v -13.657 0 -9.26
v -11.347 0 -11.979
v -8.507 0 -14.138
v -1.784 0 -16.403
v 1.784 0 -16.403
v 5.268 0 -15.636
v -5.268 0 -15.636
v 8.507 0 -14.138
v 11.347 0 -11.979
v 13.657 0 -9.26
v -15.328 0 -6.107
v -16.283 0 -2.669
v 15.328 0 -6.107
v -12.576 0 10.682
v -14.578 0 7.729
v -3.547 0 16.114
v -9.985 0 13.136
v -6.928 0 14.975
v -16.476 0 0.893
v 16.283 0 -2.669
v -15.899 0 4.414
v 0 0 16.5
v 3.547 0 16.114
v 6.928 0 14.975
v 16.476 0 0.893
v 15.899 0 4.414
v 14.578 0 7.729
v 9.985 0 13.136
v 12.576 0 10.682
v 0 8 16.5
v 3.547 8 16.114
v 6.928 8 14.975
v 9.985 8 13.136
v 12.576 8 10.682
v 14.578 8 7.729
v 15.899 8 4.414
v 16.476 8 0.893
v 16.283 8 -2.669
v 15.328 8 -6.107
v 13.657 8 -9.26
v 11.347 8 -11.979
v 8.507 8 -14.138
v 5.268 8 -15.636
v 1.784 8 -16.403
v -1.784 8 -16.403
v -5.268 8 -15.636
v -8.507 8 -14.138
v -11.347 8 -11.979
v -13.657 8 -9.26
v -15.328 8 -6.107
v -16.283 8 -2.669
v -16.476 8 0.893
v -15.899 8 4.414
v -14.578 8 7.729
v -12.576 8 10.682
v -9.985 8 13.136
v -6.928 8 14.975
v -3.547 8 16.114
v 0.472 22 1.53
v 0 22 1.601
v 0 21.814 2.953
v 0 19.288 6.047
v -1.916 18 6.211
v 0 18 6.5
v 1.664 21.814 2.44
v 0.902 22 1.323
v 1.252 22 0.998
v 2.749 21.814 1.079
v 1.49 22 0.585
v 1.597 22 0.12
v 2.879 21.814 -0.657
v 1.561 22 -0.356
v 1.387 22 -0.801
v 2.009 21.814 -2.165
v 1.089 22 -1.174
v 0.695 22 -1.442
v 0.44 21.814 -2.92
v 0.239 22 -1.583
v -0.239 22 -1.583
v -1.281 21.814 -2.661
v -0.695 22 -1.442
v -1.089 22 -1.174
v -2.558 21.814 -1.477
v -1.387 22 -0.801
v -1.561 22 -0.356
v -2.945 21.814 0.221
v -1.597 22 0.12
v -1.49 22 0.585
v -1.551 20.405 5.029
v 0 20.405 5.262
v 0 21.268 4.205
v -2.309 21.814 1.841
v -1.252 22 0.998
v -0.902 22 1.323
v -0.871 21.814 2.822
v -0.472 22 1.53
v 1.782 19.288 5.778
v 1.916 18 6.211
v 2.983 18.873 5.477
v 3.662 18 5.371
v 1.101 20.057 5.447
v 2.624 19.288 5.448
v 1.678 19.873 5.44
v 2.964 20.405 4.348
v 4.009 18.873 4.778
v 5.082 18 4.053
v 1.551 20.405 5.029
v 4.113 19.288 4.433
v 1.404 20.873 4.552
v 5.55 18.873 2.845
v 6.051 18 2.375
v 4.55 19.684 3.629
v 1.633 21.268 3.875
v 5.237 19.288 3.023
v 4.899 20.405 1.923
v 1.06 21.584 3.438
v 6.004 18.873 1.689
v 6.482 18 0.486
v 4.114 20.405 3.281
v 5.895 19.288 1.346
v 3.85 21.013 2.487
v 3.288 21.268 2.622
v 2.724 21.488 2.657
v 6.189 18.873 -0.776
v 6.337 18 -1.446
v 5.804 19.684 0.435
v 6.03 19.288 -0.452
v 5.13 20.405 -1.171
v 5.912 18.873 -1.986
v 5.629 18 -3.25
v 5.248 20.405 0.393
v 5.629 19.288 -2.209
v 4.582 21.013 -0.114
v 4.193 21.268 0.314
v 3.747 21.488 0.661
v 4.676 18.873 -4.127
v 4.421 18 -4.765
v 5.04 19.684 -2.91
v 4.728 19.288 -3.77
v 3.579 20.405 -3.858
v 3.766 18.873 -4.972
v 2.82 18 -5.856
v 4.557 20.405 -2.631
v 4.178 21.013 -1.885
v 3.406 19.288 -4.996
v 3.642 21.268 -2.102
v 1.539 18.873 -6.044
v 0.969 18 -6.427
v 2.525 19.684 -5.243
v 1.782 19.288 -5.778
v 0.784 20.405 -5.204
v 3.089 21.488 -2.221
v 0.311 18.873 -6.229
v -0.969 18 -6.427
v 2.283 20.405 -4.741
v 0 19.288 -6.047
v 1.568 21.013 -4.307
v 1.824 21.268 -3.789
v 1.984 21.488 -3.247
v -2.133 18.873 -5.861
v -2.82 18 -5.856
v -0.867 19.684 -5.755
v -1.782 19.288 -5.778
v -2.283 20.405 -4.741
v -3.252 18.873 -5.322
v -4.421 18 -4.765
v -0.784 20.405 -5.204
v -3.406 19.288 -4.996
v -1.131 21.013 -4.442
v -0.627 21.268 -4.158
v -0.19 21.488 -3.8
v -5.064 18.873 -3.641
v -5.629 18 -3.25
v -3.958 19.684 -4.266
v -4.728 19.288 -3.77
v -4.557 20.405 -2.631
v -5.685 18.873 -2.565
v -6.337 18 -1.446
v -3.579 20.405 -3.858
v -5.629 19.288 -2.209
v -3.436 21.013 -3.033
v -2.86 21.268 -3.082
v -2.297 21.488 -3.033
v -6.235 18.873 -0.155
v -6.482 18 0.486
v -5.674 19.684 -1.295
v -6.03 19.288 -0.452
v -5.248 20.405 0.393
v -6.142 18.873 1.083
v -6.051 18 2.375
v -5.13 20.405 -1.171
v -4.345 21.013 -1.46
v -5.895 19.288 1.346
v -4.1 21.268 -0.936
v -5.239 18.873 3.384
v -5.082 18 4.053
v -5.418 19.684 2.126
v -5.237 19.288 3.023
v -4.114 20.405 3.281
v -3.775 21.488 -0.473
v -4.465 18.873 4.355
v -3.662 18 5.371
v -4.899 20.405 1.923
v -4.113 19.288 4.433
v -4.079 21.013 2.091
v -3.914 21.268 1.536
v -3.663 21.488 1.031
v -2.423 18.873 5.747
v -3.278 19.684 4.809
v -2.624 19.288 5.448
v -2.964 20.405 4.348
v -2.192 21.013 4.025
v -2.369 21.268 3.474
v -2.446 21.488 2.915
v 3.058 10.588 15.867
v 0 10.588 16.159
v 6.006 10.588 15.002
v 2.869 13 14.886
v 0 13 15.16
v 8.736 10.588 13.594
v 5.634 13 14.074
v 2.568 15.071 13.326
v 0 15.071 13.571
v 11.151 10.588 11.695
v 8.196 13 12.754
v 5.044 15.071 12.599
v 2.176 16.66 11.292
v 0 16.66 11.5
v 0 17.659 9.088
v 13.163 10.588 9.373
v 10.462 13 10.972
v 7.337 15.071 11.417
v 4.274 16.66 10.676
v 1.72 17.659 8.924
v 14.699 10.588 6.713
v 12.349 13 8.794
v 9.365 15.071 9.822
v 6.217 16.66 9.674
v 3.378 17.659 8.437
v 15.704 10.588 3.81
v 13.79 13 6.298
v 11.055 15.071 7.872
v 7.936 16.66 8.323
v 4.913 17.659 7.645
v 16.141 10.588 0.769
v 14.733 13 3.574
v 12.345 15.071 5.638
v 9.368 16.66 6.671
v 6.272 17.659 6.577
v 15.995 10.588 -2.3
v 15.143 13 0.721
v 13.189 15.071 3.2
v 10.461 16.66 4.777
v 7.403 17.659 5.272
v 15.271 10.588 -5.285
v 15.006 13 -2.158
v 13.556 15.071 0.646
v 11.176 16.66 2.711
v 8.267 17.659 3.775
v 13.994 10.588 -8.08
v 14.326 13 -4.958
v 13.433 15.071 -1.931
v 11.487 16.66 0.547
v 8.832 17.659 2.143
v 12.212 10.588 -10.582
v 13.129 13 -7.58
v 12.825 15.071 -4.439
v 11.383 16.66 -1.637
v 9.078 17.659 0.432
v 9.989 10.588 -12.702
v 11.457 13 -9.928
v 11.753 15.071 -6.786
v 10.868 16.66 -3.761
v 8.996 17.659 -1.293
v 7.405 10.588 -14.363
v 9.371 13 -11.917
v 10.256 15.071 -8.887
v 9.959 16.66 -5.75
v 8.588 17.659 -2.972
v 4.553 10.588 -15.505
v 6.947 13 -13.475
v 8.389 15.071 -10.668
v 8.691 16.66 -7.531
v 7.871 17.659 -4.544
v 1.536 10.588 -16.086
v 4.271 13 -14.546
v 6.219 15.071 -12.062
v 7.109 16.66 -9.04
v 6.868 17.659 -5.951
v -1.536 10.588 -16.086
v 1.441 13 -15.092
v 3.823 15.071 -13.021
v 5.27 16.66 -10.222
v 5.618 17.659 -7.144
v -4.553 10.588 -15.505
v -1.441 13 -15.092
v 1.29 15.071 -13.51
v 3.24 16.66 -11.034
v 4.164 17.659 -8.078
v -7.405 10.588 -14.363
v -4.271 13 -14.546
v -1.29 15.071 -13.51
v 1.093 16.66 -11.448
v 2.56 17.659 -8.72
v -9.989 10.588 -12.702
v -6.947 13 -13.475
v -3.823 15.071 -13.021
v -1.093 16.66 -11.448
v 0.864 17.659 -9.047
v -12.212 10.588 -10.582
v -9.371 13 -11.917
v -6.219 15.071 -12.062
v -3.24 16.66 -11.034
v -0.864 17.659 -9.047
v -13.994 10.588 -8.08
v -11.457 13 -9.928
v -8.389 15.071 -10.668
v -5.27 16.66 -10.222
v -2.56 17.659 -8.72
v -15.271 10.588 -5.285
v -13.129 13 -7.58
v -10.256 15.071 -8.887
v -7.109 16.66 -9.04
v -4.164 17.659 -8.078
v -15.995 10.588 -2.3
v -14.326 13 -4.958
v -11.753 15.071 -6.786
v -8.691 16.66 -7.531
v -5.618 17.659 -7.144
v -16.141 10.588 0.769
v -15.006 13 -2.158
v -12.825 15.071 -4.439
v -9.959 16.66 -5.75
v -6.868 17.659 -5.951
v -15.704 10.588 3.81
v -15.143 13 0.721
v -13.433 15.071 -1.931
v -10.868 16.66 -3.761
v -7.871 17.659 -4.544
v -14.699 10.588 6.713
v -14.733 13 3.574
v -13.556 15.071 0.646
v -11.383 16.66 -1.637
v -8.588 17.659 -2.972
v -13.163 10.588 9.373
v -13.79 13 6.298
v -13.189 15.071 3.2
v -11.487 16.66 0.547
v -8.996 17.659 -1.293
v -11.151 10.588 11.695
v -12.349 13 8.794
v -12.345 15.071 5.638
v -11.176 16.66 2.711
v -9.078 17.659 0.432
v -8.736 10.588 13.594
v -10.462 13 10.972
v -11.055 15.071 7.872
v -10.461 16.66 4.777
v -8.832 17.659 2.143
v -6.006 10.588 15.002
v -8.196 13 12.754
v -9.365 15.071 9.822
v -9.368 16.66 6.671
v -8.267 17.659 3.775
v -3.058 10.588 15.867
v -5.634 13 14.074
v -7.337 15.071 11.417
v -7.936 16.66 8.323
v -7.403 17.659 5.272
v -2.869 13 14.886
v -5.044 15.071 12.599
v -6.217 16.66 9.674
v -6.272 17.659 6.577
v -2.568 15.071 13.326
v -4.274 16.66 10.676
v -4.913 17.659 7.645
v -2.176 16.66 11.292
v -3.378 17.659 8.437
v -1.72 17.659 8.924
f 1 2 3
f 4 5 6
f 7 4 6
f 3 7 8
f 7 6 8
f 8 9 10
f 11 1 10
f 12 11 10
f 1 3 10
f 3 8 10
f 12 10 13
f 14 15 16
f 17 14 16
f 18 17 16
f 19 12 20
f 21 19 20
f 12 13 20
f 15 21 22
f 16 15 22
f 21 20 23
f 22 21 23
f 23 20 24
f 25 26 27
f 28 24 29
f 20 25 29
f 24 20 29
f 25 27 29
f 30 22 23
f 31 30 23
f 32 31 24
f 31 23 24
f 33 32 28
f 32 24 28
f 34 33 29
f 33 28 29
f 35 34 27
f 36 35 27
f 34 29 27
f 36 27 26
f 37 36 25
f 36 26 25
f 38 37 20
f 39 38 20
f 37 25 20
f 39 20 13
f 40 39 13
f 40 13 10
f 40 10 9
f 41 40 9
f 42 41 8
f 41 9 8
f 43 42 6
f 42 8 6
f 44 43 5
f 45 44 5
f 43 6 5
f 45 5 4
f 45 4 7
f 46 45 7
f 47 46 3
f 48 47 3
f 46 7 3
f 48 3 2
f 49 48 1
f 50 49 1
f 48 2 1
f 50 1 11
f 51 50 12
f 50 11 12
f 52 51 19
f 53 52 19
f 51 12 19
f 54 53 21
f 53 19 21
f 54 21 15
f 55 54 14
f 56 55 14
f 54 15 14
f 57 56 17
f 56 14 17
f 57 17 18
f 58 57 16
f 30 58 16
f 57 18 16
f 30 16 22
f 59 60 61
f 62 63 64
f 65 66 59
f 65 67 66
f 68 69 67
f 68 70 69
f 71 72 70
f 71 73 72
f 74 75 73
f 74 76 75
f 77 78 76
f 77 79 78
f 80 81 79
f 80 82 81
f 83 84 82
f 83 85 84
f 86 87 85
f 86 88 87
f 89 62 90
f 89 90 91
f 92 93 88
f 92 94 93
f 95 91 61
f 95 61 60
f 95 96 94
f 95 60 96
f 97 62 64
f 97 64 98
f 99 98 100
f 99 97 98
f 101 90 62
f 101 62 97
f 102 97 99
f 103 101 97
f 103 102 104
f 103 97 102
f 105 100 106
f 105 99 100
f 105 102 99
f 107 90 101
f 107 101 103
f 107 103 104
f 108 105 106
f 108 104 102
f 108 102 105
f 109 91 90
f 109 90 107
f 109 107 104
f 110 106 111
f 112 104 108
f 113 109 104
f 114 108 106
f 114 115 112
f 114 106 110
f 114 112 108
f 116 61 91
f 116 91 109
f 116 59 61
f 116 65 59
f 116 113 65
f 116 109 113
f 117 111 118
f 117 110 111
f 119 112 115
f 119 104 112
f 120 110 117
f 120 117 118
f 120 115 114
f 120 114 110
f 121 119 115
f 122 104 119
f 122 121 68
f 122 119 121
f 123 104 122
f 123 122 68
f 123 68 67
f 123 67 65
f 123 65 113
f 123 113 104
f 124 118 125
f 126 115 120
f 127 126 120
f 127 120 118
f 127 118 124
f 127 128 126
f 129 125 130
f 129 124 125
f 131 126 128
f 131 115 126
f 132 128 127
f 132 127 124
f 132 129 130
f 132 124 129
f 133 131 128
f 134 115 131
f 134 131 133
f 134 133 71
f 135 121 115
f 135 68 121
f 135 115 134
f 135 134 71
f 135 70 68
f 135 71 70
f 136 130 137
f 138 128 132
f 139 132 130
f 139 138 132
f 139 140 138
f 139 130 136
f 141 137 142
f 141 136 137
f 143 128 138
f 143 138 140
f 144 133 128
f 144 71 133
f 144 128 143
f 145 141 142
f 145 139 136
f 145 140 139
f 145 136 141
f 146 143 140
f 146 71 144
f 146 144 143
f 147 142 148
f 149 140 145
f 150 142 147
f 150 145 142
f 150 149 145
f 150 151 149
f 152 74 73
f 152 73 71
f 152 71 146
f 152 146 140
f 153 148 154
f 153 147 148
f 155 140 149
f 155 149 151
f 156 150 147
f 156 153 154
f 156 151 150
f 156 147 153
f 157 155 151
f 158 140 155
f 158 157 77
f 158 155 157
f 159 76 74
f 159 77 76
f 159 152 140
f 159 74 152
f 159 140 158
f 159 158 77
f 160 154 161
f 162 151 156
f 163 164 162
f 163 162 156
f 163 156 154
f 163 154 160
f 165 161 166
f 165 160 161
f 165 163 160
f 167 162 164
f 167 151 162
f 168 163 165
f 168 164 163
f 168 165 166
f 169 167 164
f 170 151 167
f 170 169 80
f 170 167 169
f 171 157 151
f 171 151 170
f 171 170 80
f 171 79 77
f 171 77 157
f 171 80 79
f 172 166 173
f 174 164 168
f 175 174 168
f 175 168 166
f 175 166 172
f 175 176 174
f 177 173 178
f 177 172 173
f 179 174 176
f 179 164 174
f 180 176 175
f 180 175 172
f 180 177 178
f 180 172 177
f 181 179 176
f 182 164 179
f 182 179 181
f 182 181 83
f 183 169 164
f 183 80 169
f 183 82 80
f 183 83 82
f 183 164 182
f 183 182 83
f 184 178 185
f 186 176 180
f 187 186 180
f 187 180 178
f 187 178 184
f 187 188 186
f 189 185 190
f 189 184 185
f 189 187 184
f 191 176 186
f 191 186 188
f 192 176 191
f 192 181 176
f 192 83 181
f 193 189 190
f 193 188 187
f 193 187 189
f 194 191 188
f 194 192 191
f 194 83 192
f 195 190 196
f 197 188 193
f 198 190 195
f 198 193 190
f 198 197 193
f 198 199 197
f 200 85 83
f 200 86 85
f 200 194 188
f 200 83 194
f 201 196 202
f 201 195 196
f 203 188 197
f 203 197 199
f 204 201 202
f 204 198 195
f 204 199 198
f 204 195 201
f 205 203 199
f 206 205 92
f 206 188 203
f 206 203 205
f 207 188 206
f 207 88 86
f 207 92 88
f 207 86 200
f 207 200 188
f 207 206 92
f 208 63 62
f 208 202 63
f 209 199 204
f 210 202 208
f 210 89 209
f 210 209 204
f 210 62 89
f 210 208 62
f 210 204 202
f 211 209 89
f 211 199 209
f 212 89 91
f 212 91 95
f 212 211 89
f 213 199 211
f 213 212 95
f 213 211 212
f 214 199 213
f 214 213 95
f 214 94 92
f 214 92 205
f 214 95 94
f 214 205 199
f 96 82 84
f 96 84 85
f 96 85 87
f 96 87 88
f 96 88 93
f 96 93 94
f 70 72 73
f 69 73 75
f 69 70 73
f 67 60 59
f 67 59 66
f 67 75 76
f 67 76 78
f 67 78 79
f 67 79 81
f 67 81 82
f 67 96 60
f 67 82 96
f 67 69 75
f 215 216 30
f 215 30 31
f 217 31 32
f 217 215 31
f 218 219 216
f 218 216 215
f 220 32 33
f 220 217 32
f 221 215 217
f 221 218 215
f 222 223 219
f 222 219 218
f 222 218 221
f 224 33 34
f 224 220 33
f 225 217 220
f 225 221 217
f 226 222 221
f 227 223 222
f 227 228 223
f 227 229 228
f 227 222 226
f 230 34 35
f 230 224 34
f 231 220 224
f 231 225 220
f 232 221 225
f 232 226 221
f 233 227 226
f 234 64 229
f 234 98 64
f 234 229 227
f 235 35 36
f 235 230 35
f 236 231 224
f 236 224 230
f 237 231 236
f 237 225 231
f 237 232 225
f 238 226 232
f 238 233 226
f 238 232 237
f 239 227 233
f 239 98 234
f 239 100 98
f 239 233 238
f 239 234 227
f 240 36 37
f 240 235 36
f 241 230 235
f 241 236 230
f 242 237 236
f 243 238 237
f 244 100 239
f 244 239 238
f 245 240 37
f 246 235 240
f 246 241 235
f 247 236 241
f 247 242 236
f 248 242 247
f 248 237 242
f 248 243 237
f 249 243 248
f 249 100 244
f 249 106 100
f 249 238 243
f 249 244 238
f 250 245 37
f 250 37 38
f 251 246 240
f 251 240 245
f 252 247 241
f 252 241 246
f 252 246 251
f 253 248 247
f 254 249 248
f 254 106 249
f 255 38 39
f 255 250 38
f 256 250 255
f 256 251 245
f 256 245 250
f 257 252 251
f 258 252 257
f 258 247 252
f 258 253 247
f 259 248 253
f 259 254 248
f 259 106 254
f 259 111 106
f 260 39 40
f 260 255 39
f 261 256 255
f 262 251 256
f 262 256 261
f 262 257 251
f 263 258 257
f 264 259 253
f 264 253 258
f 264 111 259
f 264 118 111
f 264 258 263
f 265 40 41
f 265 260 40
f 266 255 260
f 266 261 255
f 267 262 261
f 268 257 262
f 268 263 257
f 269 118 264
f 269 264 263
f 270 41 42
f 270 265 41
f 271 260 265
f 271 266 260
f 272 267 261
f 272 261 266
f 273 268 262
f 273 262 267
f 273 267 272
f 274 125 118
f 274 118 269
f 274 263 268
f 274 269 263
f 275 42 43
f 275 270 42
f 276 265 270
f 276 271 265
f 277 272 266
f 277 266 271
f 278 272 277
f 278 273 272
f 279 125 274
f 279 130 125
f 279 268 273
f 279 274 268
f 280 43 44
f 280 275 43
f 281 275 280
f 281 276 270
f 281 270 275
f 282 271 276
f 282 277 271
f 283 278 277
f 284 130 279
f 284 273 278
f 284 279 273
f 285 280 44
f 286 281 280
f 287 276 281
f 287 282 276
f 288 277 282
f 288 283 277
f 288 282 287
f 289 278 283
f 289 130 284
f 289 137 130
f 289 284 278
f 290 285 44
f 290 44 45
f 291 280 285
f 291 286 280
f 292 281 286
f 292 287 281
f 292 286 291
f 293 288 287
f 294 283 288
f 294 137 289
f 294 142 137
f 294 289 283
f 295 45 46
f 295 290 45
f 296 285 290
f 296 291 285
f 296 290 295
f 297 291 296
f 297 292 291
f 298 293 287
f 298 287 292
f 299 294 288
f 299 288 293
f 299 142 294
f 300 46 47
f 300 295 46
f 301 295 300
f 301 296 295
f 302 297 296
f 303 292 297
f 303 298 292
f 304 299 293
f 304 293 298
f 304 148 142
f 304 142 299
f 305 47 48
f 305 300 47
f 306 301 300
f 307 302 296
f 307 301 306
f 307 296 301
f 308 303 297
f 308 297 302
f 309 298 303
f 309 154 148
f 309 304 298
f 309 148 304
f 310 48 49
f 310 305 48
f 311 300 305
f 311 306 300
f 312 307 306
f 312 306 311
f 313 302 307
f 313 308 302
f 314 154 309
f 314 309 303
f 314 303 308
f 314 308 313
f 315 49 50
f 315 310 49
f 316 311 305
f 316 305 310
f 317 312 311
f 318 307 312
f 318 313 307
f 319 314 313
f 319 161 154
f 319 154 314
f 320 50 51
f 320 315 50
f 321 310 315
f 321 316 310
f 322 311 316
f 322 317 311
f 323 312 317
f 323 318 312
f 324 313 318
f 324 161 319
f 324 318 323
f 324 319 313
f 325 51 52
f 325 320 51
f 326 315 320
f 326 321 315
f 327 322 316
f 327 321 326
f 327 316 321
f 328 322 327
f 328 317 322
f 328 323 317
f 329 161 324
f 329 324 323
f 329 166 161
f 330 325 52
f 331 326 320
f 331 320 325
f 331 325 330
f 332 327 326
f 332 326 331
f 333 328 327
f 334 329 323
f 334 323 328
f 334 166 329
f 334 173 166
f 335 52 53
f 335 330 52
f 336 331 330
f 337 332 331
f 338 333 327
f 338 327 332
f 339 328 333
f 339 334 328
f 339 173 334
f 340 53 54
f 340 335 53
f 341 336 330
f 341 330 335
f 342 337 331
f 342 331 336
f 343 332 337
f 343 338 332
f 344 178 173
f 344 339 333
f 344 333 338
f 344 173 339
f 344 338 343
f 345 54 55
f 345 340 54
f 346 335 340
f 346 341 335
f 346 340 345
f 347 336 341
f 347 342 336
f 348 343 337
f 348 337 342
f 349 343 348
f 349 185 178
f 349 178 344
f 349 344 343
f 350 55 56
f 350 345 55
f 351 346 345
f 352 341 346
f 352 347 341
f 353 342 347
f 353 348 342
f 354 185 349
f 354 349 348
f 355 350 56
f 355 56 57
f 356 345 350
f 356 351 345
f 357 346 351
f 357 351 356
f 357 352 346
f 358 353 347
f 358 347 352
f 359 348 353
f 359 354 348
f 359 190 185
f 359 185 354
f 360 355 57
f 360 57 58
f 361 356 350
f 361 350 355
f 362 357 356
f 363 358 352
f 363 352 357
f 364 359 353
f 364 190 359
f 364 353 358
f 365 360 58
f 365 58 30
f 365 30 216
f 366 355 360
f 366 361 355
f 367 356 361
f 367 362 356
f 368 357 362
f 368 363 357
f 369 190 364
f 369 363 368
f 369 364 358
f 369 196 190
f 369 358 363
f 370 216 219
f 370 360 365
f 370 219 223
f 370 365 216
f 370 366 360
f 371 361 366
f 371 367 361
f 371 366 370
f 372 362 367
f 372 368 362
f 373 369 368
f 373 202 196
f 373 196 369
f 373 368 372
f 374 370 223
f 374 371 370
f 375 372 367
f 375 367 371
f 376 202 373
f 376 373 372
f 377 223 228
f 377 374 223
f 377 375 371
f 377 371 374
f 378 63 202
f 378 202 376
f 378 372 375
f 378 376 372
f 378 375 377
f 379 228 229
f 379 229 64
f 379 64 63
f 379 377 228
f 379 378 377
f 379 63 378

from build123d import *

# Parameters (mm, degrees)
SKETCH1_R           = 16.5
BOSS_EXTRUDE1_DEPTH = 18
FILLET1_R           = 10
SKETCH2_R           = 6.5
BOSS_EXTRUDE2_DEPTH = 4
FILLET5_R           = 5


with BuildPart() as part:
    # Sketch1 → Boss-Extrude1 (new body)
    with BuildSketch(Plane(origin=(0, 0, 0), x_dir=(1, 0, 0), z_dir=(0, 1, 0))):
        with Locations(Location((0, 0, 0), (0, 0, 270))):
            Circle(SKETCH1_R)
    extrude(amount=BOSS_EXTRUDE1_DEPTH)

    # Fillet1
    fillet1_edges = [part.edges().sort_by_distance(p)[0] for p in [
        (0, 18, -16.5),
    ]]
    fillet(fillet1_edges, radius=FILLET1_R)

    # Sketch2 → Boss-Extrude2 (add)
    with BuildSketch(Plane(origin=(0, 18, 0), x_dir=(1, 0, 0), z_dir=(0, 1, 0))):
        with Locations(Location((0, 0, 0), (0, 0, 270))):
            Circle(SKETCH2_R)
    extrude(amount=BOSS_EXTRUDE2_DEPTH)

    # Fillet5
    # the kernel refuses this fillet: 5 mm, written as the material it takes off along each edge
    with BuildSketch(Plane(origin=(0, 22, 0), x_dir=(0, 0, 1), z_dir=(-1, 0, 0))) as fillet5_piece_1:
        with BuildLine():
            CenterArc((1.601020514, -5), FILLET5_R, 11.536959033, 78.463040967)
            Line((1.601020514, 0), (1.601020514, 0.1))
            Line((1.601020514, 0.1), (6.5, 0.1))
            Line((6.5, 0.1), (6.6, 0))
            ThreePointArc((6.6, 0), (6.6, -2), (6.59797959, -3.98))
            Line((6.59797959, -3.98), (6.5, -4))
        make_face()
    revolve(axis=Axis((0, 22, 0), (0, 1, 0)), mode=Mode.SUBTRACT)


solid = part.part
